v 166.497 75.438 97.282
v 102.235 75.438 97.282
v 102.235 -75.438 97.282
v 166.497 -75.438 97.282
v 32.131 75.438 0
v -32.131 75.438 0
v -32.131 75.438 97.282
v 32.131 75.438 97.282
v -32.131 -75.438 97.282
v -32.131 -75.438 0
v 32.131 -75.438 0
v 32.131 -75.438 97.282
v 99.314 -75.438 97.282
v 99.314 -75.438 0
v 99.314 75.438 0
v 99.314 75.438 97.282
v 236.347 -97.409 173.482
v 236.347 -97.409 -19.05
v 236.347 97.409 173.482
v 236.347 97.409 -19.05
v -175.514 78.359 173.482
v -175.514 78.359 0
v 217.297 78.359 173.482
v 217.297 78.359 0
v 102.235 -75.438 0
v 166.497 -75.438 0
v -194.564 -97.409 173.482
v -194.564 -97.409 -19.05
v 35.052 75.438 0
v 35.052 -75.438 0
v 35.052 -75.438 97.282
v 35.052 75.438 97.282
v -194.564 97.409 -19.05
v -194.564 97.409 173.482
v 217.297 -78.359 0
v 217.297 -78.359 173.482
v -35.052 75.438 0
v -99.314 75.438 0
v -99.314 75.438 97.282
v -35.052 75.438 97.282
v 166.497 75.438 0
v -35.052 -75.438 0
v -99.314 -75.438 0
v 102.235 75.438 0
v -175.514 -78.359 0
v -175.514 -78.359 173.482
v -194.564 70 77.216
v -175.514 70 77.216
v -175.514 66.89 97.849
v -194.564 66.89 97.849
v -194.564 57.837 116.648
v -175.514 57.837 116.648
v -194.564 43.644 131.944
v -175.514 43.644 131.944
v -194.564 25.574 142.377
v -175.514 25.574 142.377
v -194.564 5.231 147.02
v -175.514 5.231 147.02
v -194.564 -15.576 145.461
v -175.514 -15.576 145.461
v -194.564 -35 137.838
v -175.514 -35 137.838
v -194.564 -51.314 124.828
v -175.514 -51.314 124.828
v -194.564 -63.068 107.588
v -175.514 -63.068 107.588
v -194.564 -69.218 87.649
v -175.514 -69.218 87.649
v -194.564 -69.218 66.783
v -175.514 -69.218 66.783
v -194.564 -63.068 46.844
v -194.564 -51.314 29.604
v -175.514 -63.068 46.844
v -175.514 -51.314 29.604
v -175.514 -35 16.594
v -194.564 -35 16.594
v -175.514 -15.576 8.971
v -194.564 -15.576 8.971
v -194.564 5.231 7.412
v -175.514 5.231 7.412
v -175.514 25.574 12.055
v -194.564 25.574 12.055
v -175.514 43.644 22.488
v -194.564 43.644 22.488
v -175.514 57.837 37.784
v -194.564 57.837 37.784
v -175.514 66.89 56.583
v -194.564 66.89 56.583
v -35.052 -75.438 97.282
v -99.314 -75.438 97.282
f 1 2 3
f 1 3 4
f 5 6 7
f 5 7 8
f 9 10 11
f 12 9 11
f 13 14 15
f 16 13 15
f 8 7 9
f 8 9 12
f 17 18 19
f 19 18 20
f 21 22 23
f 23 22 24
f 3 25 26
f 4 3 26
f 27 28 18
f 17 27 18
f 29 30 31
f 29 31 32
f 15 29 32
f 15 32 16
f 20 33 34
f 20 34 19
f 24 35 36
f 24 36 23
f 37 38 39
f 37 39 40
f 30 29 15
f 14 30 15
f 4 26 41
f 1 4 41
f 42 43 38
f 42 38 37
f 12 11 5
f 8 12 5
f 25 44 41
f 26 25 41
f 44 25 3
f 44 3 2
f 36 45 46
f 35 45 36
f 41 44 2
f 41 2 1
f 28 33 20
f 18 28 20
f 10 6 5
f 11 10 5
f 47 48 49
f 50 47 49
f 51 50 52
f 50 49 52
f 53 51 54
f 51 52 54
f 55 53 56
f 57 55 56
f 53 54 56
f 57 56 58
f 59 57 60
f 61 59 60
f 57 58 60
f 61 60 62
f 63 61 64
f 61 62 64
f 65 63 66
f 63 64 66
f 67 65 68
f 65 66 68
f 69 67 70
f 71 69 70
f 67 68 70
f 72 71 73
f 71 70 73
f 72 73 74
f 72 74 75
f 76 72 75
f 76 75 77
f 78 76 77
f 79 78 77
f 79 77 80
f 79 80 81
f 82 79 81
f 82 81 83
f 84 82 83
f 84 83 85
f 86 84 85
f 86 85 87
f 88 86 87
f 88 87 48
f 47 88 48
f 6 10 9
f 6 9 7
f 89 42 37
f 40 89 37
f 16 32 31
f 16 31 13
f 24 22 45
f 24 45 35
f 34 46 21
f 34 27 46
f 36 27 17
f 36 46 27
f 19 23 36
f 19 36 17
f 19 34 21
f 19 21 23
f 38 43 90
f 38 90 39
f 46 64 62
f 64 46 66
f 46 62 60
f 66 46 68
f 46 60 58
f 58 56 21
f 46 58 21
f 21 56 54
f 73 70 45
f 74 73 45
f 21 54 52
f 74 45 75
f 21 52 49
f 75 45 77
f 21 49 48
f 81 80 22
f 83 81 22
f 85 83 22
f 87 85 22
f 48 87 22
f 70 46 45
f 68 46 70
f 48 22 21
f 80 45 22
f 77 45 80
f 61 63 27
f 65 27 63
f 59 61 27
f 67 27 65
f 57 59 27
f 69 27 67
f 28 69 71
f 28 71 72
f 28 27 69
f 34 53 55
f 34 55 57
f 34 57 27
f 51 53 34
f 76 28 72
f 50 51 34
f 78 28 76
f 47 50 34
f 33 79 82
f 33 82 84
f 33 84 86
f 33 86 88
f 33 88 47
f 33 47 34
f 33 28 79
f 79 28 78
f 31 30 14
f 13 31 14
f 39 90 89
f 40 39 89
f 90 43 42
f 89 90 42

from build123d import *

# Parameters (mm, degrees)
F0_W      = 64.262
F0_H      = 150.876
F1_DEPTH  = 97.282
F2_W      = 64.262
F2_H      = 150.876
F3_DEPTH  = 97.282
F4_W      = 64.262
F4_H      = 150.876
F5_DEPTH  = 97.282
F6_W      = 64.262
F6_H      = 150.876
F7_DEPTH  = 97.282
F8_W      = 392.8110076251
F8_H      = 156.718
F9_DEPTH  = 173.482
F10_T     = 19.05
F12_D     = 139.999974
F12_DEPTH = 25.4
F12_TIP   = 42.0602355207


with BuildPart() as f1:
    # F0 (on Top) → F1 (new body)
    with BuildSketch(Plane.XY):
        Rectangle(F0_W, F0_H)
    extrude(amount=F1_DEPTH)


with BuildPart() as f3:
    # F2 (on Top) → F3 (new body)
    with BuildSketch(Plane.XY):
        with Locations((-67.183, 0)):
            Rectangle(F2_W, F2_H)
    extrude(amount=F3_DEPTH)


with BuildPart() as f5:
    # F4 (on Top) → F5 (new body)
    with BuildSketch(Plane.XY):
        with Locations((67.1830076251, 0)):
            Rectangle(F4_W, F4_H)
    extrude(amount=F5_DEPTH)


with BuildPart() as f7:
    # F6 (on Top) → F7 (new body)
    with BuildSketch(Plane.XY):
        with Locations((134.3660076251, 0)):
            Rectangle(F6_W, F6_H)
    extrude(amount=F7_DEPTH)


with BuildPart() as f9:
    # F8 (on Top) → F9 (new body)
    with BuildSketch(Plane.XY):
        with Locations((20.8915038126, 0)):
            Rectangle(F8_W, F8_H)
    extrude(amount=F9_DEPTH)

    # F10
    f10_openings = [f9.faces().sort_by_distance(p)[0] for p in [
        (20.891504, 0, 173.482),
    ]]
    offset(amount=F10_T, openings=f10_openings, kind=Kind.INTERSECTION)

    # F12
    with Locations(Plane(origin=(-194.564, 0, 0), x_dir=(0, -1, 0), z_dir=(-1, 0, 0))):
        with Locations((0, 77.216)):
            Hole(F12_D / 2, depth=F12_DEPTH)
            with Locations((0, 0, -(F12_DEPTH + F12_TIP / 2))):  # 118° drill point
                Cone(0, F12_D / 2, F12_TIP, mode=Mode.SUBTRACT)


solid = Compound([f1.part, f3.part, f5.part, f7.part, f9.part])
